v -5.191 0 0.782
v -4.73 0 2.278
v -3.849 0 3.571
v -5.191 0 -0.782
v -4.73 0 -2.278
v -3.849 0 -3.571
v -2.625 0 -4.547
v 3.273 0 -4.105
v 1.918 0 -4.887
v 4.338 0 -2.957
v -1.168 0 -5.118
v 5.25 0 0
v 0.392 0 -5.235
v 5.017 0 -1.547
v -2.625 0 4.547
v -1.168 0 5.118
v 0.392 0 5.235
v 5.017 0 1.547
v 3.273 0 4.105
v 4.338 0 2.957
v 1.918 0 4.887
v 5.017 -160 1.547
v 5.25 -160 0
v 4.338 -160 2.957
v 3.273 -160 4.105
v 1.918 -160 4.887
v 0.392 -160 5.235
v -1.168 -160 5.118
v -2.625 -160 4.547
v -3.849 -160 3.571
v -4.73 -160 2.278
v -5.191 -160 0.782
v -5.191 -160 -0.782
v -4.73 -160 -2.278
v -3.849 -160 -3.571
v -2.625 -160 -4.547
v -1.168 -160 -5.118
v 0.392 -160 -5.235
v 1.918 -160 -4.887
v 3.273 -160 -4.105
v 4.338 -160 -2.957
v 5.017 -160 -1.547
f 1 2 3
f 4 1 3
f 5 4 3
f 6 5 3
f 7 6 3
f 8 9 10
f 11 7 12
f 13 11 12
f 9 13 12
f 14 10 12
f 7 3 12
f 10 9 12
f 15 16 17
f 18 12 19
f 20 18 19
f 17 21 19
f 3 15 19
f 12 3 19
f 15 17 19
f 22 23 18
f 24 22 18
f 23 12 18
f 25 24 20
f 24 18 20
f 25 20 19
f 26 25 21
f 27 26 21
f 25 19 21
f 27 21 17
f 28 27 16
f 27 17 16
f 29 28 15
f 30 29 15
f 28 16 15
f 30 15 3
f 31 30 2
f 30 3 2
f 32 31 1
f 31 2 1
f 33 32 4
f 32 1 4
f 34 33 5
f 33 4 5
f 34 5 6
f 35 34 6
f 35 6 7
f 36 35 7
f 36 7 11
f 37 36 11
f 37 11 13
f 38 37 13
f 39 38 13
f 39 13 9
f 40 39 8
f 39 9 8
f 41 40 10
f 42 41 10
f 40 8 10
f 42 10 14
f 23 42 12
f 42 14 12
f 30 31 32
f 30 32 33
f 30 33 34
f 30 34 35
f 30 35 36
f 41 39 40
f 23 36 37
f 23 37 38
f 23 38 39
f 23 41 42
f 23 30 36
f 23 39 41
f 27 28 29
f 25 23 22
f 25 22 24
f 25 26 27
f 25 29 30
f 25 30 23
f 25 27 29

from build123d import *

# Parameters (mm, degrees)
F0_R     = 5.25
F1_DEPTH = 110
F2_DEPTH = 100
F3_DEPTH = 50


with BuildPart() as f1:
    # F0 (on Front) → F1 (new body)
    with BuildSketch(Plane.XZ):
        Circle(F0_R)
    extrude(amount=F1_DEPTH)

    # F2 (add): a face of the model
    f2_faces = [f1.faces().sort_by_distance(p)[0] for p in [
        (0, -110, 0),
    ]]
    extrude(f2_faces, amount=F2_DEPTH)

    # F3 (cut): a face of the model
    f3_faces = [f1.faces().sort_by_distance(p)[0] for p in [
        (0, -210, 0),
    ]]
    extrude(f3_faces, amount=-F3_DEPTH, mode=Mode.SUBTRACT)


solid = f1.part
